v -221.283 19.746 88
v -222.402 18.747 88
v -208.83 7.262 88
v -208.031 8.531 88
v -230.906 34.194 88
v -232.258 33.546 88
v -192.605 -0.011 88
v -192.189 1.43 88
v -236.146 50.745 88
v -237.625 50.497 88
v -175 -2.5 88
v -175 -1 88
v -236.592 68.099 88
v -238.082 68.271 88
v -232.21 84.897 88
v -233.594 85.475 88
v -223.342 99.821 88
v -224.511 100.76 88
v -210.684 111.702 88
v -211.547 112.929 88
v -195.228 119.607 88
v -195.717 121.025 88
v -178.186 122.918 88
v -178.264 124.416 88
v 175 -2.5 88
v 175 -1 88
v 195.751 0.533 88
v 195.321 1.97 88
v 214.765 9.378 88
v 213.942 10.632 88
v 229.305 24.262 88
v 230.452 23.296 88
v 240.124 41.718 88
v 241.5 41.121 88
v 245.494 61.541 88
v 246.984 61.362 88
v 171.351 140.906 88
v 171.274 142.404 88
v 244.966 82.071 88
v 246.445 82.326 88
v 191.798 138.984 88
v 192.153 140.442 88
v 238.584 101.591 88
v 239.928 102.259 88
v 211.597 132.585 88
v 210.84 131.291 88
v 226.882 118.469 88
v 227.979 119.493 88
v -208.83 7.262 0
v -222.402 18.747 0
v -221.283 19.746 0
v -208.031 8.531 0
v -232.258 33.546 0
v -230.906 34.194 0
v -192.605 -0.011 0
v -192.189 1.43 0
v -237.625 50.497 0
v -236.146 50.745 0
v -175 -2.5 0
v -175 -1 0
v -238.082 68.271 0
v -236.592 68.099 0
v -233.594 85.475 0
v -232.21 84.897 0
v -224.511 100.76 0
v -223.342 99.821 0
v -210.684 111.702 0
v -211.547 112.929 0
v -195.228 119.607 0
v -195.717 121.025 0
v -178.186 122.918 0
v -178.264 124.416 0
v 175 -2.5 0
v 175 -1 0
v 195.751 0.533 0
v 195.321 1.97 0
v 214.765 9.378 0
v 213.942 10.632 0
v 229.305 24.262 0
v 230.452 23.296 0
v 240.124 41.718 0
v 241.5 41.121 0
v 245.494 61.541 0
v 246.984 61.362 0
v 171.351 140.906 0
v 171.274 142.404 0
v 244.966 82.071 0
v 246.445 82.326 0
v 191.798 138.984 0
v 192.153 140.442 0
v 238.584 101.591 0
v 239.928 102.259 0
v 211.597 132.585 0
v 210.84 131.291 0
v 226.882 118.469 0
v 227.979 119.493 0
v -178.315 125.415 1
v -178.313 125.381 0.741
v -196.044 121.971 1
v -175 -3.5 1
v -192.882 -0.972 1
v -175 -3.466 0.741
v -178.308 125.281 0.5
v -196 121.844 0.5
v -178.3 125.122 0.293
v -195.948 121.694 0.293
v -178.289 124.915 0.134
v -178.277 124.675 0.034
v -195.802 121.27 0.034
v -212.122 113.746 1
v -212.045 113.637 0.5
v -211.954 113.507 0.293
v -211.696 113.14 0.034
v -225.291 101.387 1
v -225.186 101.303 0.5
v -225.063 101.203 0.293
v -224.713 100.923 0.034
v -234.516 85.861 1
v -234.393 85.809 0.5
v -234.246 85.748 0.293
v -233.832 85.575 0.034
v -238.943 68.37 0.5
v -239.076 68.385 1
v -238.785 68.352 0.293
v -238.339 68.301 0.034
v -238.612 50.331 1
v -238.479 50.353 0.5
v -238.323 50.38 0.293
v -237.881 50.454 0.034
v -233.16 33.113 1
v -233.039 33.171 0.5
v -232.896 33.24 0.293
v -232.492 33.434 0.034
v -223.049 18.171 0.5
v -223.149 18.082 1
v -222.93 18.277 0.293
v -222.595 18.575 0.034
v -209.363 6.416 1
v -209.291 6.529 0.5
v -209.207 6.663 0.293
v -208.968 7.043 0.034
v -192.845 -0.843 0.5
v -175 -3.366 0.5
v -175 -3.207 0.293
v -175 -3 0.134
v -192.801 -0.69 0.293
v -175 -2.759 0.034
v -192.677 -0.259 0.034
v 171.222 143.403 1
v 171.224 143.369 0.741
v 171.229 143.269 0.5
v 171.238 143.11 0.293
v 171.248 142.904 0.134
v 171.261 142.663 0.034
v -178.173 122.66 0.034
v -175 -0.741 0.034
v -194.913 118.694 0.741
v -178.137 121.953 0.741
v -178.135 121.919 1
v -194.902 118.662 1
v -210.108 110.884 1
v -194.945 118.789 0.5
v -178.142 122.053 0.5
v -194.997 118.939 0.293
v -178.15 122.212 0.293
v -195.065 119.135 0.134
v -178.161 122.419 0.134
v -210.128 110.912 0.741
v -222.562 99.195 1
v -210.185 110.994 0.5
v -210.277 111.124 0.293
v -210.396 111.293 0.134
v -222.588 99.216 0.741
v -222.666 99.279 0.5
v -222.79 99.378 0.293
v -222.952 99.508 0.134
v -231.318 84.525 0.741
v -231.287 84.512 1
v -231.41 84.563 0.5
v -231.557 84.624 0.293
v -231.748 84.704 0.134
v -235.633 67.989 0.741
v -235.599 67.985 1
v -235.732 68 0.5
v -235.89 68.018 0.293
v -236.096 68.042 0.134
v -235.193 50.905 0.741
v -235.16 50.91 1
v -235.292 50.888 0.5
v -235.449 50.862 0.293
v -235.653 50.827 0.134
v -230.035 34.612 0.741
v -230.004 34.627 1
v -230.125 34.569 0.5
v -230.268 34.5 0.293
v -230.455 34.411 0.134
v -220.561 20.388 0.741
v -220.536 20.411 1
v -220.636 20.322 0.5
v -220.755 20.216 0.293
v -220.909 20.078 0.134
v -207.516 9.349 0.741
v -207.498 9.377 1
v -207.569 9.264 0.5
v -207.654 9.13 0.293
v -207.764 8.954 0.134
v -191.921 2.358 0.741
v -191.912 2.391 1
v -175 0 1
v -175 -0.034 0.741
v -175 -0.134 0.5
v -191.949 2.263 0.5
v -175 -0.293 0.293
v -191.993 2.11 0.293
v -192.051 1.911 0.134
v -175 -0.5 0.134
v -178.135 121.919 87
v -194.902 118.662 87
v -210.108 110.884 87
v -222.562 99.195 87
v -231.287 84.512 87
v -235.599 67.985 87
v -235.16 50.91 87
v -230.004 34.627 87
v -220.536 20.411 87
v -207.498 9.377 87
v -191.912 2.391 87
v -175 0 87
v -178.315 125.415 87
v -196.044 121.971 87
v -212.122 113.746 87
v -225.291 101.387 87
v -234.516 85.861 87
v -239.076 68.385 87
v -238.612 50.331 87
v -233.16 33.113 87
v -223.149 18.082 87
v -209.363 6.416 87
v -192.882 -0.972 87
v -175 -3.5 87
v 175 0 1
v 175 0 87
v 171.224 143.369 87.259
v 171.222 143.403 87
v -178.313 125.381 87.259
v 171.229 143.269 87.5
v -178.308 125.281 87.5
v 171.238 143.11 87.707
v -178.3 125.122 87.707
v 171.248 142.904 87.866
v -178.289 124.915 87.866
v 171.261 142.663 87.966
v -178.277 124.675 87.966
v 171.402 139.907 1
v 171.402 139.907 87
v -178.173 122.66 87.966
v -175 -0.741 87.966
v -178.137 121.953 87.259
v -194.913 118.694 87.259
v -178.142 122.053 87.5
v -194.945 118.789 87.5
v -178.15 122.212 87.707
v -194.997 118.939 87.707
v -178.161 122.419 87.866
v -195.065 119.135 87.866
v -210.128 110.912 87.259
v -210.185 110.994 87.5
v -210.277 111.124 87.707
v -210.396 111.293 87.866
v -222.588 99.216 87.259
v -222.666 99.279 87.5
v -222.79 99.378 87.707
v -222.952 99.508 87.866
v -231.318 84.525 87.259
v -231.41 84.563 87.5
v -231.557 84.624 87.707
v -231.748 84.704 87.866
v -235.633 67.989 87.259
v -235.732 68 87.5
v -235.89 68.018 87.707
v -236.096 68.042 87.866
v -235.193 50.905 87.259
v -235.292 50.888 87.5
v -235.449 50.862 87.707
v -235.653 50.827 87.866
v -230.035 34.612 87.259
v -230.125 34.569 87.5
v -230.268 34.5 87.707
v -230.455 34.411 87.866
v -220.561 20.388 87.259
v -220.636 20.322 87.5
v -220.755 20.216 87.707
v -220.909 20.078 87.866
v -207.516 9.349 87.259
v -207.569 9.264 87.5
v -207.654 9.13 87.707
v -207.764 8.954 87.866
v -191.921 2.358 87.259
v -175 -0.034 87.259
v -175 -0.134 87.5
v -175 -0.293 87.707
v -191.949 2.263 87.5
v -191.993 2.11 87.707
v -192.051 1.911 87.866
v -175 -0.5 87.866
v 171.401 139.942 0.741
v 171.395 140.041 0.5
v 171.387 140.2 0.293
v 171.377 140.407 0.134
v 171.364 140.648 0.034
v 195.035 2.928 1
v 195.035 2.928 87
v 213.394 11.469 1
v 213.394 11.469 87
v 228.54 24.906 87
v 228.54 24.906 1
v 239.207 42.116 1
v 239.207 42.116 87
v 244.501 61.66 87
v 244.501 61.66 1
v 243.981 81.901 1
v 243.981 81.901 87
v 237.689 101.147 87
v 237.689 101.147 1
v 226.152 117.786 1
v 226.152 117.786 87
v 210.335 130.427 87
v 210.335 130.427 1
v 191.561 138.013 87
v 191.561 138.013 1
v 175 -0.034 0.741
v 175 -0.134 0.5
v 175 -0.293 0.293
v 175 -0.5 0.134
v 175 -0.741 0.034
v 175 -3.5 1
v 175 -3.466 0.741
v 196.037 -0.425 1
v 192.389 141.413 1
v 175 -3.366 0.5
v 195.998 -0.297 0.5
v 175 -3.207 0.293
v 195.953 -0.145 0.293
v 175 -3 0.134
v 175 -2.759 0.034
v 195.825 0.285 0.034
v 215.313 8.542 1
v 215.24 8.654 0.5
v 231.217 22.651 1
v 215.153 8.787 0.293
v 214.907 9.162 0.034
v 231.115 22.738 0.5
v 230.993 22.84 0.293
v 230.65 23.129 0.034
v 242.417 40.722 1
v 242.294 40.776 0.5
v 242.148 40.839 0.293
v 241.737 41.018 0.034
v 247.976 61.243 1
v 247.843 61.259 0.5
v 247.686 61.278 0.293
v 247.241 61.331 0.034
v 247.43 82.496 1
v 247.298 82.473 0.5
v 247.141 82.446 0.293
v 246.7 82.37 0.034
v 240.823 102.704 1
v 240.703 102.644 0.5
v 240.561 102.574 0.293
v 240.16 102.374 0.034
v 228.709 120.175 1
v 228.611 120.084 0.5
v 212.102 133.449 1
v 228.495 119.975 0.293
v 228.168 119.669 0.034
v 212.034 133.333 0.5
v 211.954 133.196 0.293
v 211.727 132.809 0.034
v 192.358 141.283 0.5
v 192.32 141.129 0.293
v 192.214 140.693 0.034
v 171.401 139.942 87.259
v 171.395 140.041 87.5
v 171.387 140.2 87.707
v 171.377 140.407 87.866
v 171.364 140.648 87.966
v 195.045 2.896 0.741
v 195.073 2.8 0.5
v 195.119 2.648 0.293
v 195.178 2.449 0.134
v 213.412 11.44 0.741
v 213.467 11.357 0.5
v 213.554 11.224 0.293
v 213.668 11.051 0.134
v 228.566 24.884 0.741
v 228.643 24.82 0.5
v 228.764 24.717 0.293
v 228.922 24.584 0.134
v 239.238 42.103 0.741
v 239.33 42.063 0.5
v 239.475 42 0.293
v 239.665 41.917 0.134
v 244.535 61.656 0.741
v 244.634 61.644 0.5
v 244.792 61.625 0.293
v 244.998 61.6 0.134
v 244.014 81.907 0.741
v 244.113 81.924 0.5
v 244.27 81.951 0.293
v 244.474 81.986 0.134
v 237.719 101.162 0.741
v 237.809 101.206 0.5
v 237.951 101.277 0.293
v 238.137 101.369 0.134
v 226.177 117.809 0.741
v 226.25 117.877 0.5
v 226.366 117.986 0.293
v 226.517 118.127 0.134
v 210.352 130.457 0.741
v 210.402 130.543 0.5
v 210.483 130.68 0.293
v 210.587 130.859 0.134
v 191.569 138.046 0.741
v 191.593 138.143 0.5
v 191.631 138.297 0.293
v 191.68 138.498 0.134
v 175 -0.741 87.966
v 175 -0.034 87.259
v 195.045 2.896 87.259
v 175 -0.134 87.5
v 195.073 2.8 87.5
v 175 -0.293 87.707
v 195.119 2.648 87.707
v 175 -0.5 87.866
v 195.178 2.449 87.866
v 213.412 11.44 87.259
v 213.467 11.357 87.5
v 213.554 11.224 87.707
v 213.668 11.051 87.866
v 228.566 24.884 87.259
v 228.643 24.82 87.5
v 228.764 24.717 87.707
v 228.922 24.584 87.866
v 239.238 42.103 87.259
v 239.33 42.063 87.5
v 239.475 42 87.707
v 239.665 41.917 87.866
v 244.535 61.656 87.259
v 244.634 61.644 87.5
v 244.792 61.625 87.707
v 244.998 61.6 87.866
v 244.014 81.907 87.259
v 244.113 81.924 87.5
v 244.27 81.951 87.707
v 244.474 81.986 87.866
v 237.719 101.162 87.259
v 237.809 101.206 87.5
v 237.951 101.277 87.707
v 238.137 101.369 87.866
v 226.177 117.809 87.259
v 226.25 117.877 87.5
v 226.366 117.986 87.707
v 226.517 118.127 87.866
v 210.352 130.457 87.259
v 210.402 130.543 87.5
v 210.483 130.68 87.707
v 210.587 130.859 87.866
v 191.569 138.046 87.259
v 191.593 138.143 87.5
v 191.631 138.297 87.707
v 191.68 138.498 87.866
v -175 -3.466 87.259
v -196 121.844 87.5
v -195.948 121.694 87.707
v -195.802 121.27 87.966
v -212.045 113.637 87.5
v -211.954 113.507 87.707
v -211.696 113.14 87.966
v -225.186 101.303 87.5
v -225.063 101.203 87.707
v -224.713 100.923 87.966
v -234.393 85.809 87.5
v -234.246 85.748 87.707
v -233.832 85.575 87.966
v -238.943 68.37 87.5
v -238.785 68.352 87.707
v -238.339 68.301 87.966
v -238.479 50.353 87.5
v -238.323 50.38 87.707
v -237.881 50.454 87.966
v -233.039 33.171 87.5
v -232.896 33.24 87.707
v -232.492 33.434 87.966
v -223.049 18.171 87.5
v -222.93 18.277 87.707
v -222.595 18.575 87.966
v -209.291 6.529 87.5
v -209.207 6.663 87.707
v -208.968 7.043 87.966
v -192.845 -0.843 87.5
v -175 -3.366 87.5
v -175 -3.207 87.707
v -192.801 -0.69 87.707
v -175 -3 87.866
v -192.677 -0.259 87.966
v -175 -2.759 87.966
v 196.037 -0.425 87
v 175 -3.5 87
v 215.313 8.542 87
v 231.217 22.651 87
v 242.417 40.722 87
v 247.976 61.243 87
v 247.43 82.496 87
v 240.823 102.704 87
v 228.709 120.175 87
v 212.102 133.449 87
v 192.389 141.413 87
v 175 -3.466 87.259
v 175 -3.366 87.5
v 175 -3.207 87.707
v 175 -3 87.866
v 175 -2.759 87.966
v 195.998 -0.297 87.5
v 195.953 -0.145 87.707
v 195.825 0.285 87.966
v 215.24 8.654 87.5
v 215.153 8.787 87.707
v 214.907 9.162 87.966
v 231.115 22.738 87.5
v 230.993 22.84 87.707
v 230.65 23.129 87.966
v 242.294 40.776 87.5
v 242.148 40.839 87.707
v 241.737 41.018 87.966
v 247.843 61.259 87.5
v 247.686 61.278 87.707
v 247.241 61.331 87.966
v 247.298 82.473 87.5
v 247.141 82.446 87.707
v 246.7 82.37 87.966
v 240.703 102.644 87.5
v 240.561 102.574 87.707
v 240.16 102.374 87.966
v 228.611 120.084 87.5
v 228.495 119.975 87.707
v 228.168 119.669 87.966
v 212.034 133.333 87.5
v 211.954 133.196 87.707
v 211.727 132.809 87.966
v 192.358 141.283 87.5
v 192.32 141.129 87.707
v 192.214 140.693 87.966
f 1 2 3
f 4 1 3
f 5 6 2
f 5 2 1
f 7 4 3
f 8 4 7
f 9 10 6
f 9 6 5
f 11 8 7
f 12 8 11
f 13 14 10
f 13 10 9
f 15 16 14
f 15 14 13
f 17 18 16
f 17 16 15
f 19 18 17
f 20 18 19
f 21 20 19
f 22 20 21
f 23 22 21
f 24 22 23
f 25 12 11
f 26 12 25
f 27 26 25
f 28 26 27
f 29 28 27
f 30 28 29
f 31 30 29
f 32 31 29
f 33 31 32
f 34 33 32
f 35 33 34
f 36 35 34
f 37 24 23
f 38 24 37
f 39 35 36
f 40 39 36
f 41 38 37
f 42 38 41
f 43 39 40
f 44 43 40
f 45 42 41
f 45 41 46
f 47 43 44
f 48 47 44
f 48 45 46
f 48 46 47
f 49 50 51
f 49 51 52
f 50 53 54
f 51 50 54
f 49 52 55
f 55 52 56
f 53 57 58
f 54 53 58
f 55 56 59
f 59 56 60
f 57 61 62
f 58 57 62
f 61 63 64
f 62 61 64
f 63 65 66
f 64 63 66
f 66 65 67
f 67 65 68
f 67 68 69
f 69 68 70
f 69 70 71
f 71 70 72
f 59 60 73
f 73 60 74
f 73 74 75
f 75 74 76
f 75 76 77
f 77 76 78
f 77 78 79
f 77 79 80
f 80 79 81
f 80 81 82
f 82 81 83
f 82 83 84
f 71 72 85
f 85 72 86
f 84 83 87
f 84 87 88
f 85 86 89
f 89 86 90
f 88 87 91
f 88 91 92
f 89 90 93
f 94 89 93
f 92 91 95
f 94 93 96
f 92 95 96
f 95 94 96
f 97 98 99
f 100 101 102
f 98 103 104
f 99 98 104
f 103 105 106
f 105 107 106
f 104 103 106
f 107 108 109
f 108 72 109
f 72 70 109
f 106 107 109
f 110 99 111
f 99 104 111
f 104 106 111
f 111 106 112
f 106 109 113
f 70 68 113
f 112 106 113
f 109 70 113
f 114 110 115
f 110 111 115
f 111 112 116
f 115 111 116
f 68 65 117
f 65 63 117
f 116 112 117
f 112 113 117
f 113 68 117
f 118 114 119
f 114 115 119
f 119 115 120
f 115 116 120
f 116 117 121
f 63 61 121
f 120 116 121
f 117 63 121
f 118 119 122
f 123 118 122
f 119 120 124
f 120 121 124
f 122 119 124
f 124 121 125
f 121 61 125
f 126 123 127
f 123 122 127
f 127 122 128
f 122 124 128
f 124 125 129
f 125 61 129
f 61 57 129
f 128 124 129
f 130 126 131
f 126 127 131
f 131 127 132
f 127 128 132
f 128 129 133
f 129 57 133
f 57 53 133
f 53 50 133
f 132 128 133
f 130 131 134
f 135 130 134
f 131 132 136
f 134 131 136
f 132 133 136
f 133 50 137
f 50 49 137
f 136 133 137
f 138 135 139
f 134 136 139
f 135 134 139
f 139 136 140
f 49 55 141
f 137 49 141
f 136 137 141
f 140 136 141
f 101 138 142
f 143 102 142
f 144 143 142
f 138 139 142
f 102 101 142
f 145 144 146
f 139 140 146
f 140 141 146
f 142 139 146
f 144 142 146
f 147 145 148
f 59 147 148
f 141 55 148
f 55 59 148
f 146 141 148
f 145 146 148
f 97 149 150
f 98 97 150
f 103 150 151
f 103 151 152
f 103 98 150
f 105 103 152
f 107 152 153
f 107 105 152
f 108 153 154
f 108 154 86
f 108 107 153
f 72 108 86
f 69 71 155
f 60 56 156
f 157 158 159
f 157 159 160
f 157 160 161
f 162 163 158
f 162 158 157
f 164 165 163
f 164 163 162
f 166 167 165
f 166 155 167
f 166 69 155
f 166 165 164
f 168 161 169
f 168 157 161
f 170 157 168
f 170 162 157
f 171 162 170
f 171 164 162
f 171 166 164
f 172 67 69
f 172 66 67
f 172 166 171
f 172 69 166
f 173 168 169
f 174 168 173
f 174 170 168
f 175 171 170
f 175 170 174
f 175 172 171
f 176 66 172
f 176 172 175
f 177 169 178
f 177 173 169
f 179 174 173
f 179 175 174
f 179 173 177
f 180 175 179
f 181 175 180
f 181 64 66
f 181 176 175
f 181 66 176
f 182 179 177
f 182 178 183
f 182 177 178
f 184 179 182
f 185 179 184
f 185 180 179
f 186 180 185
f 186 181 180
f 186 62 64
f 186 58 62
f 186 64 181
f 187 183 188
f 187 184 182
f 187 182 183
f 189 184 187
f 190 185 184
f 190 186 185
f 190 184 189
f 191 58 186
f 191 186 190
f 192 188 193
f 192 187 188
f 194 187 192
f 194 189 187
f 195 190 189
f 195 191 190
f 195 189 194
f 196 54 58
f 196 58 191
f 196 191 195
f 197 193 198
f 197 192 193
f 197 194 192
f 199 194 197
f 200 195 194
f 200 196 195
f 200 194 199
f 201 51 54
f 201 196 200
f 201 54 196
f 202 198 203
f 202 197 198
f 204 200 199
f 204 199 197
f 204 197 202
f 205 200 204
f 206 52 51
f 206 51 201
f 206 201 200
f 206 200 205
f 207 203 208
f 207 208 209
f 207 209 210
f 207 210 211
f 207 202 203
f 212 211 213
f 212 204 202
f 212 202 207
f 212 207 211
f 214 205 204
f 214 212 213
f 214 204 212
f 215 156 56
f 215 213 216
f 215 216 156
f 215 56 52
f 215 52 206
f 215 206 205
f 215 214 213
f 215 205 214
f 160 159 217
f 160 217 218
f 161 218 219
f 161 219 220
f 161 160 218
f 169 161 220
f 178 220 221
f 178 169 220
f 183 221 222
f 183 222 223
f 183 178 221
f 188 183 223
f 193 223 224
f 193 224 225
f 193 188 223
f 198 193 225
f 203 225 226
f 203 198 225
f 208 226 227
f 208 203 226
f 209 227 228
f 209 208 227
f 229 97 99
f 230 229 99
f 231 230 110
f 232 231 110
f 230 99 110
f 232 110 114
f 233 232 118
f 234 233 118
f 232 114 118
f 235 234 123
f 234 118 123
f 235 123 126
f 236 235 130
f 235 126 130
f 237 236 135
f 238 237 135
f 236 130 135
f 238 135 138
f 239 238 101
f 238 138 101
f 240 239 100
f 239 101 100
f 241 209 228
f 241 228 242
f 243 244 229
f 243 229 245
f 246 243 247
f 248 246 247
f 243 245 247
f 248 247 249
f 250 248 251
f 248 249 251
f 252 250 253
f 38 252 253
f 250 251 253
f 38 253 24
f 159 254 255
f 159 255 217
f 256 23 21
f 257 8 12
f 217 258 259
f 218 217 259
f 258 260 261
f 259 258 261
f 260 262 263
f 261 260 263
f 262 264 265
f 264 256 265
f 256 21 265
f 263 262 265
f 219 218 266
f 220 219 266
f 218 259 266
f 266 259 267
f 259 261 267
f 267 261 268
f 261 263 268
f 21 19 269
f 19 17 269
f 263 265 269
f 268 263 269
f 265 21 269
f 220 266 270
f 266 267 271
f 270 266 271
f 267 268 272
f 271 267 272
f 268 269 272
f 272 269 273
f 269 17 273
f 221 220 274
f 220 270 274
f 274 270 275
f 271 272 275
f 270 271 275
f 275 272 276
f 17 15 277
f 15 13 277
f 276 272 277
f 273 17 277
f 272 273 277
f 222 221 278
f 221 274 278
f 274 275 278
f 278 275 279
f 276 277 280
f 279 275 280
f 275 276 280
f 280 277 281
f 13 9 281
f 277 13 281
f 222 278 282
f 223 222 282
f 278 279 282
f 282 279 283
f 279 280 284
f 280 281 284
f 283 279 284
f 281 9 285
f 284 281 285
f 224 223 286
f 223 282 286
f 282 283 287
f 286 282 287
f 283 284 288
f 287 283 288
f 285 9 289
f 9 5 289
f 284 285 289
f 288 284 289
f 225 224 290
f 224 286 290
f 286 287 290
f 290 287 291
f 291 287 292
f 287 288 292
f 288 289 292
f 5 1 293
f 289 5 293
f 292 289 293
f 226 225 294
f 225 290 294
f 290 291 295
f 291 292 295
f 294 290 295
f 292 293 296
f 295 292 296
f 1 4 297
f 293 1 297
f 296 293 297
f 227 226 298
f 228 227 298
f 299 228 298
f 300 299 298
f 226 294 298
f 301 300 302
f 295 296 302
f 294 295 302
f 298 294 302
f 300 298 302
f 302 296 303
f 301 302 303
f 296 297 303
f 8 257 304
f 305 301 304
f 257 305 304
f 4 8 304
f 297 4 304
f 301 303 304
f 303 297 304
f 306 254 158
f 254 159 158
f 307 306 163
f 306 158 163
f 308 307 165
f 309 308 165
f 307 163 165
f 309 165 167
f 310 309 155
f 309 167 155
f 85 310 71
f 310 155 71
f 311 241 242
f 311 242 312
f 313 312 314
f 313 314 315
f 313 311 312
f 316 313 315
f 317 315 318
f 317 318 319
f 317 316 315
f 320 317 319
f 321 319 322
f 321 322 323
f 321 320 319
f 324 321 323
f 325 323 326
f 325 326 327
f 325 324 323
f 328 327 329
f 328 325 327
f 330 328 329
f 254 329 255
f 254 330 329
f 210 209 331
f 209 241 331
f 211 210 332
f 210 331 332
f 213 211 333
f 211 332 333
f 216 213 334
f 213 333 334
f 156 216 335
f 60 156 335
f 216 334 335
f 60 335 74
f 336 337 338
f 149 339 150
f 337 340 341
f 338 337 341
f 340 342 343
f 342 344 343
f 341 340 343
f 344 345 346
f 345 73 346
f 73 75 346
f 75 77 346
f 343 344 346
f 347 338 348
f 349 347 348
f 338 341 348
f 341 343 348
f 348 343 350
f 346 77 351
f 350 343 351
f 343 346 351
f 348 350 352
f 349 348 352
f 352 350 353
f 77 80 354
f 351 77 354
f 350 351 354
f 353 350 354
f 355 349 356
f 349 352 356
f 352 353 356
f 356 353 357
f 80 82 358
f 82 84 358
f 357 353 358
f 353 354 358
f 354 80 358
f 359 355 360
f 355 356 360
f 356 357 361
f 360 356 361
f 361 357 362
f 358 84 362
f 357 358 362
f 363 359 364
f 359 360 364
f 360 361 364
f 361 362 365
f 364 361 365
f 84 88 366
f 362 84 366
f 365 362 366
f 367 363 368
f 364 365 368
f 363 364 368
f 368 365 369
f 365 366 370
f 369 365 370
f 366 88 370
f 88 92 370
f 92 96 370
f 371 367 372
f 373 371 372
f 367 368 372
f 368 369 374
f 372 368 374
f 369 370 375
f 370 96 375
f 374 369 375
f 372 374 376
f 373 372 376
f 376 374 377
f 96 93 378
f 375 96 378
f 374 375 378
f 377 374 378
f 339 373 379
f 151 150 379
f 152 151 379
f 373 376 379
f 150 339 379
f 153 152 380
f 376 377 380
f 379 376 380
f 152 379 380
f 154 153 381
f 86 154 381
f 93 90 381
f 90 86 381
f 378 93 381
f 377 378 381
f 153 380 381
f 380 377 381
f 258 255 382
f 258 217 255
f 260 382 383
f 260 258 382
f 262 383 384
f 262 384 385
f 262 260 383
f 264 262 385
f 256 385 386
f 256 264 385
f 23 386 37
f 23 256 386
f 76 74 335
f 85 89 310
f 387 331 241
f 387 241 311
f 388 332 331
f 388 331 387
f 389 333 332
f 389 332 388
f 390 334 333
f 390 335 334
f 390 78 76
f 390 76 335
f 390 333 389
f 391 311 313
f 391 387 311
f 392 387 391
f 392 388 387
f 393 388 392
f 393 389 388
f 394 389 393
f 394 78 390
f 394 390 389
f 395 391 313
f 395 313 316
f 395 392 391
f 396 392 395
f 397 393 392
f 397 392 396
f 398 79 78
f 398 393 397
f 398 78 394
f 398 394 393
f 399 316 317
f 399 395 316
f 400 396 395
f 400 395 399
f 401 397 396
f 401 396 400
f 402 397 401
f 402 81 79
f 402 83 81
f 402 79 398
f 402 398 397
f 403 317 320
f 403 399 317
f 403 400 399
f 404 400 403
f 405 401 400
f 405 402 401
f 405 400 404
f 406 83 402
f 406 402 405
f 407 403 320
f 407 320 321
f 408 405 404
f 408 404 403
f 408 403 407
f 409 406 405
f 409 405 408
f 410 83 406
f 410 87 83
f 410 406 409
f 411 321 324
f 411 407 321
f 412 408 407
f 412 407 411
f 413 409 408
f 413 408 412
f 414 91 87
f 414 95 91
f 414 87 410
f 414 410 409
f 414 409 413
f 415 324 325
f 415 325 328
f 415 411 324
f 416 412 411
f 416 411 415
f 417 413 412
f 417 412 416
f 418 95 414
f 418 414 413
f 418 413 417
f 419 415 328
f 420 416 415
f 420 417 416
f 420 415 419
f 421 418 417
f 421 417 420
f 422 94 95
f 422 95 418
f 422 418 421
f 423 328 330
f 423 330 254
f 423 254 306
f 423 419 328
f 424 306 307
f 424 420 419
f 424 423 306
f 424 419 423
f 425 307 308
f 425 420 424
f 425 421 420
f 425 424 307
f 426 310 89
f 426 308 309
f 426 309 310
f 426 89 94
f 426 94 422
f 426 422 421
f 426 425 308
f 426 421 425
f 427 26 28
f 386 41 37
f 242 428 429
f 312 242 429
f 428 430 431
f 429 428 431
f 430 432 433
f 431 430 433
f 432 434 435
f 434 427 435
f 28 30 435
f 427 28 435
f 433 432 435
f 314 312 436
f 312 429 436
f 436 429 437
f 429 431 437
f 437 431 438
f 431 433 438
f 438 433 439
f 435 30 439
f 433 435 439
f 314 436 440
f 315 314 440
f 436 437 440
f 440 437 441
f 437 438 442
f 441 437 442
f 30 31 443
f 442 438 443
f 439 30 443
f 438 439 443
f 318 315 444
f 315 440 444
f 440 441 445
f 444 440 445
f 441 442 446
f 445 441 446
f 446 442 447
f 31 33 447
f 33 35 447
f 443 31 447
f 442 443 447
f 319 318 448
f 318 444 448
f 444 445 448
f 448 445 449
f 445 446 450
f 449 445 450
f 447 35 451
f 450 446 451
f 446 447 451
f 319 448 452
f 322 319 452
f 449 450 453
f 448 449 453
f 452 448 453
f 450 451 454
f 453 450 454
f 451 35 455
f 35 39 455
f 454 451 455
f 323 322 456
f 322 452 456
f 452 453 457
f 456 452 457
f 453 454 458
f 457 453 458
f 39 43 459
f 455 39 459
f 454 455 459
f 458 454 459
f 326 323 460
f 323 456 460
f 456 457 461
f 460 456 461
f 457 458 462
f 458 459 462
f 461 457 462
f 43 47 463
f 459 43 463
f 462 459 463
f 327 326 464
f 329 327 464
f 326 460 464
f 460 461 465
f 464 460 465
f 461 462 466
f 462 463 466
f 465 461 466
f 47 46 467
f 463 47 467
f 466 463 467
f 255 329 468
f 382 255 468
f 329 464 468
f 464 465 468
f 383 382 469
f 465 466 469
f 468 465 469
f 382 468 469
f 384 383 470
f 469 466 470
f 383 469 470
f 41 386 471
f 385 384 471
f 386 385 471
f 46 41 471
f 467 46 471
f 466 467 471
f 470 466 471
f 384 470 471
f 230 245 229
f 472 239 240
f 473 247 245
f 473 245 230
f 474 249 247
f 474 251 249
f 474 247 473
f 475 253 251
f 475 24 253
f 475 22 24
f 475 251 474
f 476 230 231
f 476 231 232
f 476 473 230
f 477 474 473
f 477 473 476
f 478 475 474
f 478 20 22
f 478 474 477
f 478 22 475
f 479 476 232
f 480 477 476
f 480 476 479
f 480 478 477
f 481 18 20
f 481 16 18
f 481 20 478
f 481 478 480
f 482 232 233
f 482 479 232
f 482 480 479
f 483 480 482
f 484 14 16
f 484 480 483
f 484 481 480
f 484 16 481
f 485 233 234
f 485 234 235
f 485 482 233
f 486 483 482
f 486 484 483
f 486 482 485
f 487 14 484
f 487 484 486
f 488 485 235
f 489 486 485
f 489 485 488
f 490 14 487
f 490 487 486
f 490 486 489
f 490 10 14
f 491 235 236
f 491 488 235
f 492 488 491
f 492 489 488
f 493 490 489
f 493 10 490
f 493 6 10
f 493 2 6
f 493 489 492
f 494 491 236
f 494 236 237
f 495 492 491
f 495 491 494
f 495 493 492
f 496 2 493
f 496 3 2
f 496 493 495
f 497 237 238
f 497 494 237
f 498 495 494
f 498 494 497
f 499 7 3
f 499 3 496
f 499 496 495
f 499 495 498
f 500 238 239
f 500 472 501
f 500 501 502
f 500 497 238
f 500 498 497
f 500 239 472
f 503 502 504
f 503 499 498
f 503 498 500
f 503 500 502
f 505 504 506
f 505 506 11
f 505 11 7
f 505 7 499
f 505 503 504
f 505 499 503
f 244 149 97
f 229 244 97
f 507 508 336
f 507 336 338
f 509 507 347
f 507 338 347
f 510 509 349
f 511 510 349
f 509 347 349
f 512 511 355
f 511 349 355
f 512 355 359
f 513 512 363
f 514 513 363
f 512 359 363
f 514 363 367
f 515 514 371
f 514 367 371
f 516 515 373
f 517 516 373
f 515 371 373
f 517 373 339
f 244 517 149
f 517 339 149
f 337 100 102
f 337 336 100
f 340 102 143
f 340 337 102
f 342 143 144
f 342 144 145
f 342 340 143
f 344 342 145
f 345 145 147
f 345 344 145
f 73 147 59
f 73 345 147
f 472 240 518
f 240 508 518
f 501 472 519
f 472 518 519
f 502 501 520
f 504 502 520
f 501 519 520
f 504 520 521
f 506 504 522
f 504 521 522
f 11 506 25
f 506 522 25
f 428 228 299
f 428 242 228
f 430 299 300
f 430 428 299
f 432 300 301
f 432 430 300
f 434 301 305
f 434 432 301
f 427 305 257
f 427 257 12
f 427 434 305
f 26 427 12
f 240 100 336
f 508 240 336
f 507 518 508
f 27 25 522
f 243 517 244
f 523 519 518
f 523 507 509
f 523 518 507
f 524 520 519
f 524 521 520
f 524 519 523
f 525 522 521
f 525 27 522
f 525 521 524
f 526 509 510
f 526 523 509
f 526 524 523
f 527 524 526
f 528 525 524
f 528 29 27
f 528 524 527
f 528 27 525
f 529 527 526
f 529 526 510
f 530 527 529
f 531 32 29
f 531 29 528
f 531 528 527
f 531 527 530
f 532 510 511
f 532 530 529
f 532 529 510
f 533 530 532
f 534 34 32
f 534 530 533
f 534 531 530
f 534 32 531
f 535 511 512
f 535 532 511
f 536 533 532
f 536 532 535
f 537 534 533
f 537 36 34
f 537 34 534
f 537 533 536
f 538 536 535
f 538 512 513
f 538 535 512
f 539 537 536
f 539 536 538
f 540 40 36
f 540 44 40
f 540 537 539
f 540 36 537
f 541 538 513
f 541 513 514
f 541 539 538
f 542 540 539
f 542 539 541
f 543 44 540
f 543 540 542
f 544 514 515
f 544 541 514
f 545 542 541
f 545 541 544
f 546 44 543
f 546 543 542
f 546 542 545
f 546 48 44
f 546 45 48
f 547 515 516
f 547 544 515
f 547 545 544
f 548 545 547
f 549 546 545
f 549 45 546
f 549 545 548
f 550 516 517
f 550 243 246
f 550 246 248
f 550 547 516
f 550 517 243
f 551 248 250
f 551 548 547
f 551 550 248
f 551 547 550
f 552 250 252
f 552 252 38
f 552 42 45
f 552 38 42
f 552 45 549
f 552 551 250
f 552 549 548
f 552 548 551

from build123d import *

# Parameters (mm, degrees)
BOSS_EXTRUDE1_DEPTH = 88
FILLET1_R           = 1


with BuildPart() as part:
    # Sketch1 → Boss-Extrude1 (new body)
    with BuildSketch(Plane.XY):
        with BuildLine():
            Line((-175, -3.5), (175, -3.5))
            ThreePointArc((175, -3.5), (248.475712044, 71.889375453), (171.222497777, 143.402864229))
            Line((171.222497777, 143.402864229), (-178.31495093, 125.414758405))
            ThreePointArc((-178.31495093, 125.414758405), (-239.47868608, 59.341976644), (-175, -3.5))
        make_face()
        with BuildLine():
            Line((-175, 0), (175, 0))
            ThreePointArc((175, 0), (244.976868614, 71.799405193), (171.402378835, 139.907489741))
            Line((171.402378835, 139.907489741), (-178.135069872, 121.919383918))
            ThreePointArc((-178.135069872, 121.919383918), (-235.979842649, 59.431946903), (-175, 0))
        make_face(mode=Mode.SUBTRACT)
    extrude(amount=BOSS_EXTRUDE1_DEPTH)

    # Fillet1
    fillet1_edges = [part.edges().sort_by_distance(p)[0] for p in [
        (248.475712044, 71.889375453, 88),
        (-235.979842649, 59.431946903, 0),
        (0, 0, 0),
        (244.976868614, 71.799405193, 0),
        (-3.366345518, 130.91343683, 0),
        (-235.979842649, 59.431946903, 88),
        (-3.546226577, 134.408811317, 88),
        (0, 0, 88),
        (244.976868614, 71.799405193, 88),
        (-3.366345518, 130.91343683, 88),
        (-239.47868608, 59.341976644, 88),
        (-3.546226577, 134.408811317, 0),
        (248.475712044, 71.889375453, 0),
        (0, -3.5, 0),
        (-239.47868608, 59.341976644, 0),
        (0, -3.5, 88),
    ]]
    fillet(fillet1_edges, radius=FILLET1_R)


solid = part.part
